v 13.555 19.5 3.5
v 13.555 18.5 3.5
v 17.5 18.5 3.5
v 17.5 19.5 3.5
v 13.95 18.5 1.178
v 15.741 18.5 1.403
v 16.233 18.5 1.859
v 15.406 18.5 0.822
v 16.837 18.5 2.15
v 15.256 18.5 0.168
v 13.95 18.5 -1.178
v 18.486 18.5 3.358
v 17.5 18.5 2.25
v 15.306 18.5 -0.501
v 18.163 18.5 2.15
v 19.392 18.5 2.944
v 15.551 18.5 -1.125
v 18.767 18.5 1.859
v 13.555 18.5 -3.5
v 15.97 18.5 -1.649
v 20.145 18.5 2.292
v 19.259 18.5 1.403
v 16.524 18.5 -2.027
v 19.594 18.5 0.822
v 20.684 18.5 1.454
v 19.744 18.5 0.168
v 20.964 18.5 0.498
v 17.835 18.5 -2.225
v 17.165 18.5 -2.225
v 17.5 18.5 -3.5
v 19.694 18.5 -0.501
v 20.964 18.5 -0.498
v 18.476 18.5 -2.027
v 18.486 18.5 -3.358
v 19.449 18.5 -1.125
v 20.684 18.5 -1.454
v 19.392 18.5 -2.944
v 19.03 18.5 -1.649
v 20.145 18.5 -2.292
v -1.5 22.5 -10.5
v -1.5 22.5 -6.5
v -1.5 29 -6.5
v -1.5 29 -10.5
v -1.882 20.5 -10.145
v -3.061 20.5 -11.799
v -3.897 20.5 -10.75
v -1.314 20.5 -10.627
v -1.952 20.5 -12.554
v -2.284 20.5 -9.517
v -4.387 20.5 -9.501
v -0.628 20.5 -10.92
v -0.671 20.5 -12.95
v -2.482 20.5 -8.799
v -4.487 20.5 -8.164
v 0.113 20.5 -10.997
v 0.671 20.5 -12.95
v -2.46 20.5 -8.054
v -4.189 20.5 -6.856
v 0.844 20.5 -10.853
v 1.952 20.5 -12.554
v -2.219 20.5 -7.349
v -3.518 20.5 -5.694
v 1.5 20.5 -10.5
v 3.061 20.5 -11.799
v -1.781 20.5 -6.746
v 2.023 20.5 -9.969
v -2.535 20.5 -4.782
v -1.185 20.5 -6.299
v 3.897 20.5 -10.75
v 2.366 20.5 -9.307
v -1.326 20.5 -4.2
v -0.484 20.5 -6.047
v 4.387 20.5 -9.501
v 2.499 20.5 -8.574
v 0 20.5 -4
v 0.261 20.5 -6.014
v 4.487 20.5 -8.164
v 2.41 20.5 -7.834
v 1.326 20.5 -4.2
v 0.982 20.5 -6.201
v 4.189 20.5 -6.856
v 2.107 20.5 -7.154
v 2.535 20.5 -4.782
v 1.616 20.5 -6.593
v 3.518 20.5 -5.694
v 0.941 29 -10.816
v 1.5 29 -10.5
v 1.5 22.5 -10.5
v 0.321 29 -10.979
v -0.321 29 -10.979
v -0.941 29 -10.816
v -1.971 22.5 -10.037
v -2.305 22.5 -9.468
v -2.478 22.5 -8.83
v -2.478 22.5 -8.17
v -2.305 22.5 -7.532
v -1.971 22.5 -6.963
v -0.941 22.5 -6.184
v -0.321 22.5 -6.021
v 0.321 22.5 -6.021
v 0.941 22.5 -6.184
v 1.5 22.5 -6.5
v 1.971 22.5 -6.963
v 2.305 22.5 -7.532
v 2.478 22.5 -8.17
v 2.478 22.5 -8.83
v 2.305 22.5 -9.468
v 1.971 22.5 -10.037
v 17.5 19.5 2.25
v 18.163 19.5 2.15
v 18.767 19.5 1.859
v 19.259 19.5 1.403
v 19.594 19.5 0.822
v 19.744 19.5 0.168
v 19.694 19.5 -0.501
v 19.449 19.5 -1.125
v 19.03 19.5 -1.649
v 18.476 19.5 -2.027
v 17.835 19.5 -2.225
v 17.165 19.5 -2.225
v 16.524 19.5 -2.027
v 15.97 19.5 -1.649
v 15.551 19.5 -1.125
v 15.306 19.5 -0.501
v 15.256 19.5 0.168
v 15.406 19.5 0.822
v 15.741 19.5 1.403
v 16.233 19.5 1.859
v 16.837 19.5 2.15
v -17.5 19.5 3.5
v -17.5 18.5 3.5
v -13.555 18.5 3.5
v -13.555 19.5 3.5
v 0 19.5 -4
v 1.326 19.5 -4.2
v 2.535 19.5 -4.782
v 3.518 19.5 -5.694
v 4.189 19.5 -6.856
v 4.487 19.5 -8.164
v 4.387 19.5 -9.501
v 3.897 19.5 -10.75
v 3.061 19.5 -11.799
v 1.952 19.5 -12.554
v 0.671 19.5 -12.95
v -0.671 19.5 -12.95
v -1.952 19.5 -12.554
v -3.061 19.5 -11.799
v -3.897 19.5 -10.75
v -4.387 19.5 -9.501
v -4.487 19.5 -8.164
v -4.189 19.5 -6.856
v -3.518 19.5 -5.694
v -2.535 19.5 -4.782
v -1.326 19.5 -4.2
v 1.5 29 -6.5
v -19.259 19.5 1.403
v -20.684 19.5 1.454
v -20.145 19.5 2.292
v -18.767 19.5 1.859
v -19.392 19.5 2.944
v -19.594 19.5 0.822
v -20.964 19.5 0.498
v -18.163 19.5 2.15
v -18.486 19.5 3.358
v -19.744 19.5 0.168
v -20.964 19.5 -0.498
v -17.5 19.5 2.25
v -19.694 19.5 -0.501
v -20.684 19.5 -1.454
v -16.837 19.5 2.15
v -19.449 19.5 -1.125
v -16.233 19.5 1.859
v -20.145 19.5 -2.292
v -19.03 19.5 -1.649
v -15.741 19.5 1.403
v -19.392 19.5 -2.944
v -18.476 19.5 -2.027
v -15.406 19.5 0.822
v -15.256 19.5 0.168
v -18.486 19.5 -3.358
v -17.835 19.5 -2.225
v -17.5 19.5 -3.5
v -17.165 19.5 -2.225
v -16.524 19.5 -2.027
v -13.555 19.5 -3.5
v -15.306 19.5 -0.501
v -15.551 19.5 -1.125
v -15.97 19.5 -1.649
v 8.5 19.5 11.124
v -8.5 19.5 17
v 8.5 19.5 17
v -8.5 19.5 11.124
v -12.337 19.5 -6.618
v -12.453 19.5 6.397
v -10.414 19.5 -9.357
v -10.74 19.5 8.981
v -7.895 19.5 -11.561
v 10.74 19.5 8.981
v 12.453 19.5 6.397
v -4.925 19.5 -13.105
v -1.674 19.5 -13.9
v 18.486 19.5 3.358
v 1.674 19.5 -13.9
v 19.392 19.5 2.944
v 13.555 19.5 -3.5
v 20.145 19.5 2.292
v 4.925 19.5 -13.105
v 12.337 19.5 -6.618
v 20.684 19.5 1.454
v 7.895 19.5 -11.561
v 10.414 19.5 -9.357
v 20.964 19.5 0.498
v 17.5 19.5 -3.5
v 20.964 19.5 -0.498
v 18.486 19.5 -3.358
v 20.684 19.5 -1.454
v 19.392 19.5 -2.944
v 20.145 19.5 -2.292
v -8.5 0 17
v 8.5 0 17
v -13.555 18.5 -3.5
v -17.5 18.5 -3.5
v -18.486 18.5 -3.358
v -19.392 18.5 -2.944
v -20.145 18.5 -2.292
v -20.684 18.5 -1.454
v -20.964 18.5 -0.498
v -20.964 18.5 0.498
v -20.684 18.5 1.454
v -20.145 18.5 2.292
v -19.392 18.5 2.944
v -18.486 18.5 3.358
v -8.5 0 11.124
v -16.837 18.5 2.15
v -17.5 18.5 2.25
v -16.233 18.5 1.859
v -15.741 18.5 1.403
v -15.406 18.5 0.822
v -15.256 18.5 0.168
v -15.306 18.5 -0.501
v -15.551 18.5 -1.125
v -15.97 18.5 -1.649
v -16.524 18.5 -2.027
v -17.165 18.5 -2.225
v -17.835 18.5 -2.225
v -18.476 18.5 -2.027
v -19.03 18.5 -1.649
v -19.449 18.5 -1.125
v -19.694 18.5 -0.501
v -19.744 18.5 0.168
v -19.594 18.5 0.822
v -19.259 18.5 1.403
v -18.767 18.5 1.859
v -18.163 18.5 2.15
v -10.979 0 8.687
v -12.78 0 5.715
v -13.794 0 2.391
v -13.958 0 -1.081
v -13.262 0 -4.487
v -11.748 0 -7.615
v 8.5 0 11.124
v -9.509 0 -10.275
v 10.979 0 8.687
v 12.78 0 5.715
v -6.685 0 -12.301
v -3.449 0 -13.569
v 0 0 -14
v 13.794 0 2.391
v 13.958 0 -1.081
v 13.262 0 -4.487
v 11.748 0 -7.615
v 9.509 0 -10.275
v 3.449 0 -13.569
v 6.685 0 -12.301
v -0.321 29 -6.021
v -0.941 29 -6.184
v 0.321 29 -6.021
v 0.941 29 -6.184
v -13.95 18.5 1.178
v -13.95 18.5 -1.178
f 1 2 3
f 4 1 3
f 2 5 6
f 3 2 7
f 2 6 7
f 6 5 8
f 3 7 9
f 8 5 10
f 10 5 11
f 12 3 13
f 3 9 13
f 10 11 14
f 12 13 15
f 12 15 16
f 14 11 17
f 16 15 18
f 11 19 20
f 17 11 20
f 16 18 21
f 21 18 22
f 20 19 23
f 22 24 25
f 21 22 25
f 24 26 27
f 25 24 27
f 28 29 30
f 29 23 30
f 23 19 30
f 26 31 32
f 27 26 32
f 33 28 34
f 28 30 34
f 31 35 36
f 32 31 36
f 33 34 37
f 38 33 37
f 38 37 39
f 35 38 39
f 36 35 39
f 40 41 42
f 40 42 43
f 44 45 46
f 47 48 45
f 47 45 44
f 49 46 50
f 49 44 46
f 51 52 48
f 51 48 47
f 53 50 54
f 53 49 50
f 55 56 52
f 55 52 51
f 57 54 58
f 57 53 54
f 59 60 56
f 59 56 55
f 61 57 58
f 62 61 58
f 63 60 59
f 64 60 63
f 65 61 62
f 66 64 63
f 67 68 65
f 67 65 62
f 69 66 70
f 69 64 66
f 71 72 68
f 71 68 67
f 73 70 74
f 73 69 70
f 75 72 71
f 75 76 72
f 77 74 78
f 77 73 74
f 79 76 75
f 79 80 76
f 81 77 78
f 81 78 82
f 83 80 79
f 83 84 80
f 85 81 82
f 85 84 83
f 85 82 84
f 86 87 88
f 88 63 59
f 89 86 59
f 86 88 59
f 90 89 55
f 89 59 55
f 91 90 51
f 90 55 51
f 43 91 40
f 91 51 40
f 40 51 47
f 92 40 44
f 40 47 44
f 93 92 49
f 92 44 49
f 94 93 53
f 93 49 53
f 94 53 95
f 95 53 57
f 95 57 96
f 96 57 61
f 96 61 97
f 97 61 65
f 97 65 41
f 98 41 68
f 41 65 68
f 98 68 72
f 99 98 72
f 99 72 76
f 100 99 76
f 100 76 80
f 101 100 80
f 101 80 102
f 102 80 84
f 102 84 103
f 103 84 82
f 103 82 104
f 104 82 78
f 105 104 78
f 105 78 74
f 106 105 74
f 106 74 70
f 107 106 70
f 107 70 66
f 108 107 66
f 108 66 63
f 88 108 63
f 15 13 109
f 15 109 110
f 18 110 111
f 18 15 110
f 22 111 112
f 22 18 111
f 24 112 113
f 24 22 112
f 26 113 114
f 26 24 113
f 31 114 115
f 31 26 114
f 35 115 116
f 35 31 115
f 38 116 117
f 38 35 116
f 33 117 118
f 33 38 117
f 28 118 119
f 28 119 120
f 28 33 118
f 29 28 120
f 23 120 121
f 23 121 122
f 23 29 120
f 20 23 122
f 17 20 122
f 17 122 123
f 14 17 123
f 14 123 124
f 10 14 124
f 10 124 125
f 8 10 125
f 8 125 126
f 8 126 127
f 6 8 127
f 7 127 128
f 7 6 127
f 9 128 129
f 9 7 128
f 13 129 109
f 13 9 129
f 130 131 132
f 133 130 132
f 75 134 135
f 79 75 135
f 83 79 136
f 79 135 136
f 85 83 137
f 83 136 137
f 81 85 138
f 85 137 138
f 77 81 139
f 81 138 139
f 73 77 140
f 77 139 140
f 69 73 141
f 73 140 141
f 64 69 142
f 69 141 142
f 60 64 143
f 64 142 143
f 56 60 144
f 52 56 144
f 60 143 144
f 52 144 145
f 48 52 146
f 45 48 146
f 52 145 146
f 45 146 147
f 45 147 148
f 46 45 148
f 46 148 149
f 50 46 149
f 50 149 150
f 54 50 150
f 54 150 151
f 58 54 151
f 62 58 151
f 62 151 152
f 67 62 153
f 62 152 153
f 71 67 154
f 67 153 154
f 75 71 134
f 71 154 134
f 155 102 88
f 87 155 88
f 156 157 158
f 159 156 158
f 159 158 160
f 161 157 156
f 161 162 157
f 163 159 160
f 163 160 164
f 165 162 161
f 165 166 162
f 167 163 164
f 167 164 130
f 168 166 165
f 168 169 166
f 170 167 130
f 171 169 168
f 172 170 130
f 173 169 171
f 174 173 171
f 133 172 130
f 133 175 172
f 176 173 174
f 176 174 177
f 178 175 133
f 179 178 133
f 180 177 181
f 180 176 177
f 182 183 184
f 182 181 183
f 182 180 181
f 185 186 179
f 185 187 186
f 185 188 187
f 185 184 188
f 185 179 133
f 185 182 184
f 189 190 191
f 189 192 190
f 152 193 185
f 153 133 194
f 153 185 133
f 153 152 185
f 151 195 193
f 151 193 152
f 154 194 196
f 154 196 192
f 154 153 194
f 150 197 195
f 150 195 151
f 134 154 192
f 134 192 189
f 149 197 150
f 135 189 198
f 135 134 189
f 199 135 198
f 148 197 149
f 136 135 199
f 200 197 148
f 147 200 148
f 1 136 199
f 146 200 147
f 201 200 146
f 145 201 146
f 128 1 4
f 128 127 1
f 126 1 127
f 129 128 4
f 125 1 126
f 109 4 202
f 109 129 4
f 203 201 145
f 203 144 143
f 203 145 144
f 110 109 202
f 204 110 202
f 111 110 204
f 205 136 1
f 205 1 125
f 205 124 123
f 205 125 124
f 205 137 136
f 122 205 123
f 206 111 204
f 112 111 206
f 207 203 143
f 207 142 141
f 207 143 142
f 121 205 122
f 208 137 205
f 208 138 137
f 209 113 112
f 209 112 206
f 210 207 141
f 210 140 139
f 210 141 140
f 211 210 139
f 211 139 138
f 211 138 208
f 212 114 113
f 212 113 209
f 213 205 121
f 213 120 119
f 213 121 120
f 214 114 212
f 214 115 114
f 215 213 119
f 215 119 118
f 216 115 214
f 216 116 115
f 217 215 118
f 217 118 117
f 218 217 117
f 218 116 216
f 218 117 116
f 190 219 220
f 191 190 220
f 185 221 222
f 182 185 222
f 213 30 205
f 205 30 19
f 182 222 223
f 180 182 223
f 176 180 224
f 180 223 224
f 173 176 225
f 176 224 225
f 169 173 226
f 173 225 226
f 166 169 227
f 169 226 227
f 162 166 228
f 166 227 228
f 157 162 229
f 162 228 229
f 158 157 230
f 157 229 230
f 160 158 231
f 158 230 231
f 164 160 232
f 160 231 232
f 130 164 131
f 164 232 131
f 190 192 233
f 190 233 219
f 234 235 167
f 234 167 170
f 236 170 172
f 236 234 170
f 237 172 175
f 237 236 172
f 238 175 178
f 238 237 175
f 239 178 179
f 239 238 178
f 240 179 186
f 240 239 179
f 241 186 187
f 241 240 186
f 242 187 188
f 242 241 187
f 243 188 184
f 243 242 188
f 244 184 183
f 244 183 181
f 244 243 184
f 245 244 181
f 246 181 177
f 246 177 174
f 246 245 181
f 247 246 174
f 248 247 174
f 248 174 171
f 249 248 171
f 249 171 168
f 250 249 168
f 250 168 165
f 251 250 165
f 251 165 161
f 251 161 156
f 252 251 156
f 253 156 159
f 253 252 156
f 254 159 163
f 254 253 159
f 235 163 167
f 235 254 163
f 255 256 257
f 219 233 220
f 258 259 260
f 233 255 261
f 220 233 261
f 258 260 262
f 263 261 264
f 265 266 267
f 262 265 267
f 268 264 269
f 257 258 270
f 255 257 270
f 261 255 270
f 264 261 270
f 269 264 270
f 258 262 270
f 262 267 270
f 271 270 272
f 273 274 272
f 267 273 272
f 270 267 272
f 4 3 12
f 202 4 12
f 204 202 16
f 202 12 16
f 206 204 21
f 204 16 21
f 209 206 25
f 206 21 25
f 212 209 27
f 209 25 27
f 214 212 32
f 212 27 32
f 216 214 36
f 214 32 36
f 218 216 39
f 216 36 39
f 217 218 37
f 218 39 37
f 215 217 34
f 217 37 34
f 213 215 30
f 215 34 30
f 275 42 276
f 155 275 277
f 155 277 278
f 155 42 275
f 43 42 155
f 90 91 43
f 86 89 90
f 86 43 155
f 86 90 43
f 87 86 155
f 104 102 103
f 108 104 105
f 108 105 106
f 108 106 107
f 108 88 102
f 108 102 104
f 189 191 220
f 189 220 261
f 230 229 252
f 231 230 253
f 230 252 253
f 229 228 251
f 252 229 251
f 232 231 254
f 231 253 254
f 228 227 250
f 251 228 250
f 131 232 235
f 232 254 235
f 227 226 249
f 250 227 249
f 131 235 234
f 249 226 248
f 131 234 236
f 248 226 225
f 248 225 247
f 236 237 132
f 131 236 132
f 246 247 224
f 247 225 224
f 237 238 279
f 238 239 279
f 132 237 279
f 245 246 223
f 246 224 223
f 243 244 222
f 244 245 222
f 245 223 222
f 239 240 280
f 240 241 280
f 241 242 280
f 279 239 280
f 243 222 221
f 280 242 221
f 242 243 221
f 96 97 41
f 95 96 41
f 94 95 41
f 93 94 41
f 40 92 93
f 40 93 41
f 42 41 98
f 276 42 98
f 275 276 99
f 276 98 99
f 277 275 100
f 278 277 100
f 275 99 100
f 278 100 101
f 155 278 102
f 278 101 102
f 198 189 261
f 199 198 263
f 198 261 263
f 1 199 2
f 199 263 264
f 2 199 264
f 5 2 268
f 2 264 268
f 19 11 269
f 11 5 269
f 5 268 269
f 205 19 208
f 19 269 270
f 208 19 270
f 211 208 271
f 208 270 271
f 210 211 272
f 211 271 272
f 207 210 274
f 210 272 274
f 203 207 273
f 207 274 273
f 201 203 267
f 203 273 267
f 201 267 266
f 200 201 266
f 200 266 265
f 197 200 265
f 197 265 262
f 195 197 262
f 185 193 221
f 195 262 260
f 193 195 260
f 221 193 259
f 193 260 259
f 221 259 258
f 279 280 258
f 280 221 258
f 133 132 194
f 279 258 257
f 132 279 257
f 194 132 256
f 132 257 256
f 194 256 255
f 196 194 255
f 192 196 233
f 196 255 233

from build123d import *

# Parameters (mm, degrees)
BOSS_EXTRUDE1_DEPTH = 19.5
BOSS_EXTRUDE2_START = 18.5
SKETCH2_3_R         = 2.250000000000002
SKETCH2_3_R_2       = 2.249999999999999
BOSS_EXTRUDE2_DEPTH = 1
BOSS_EXTRUDE3_START = 19.5
SKETCH2_4_R         = 4.5
SKETCH2_4_R_2       = 2.5000000000000004
SKETCH2_4_W         = 3
SKETCH2_4_H         = 3.9999999999999973
BOSS_EXTRUDE3_DEPTH = 1
BOSS_EXTRUDE4_START = 20.5
SKETCH2_5_W         = 3
SKETCH2_5_H         = 3.9999999999999973
BOSS_EXTRUDE4_DEPTH = 2
BOSS_EXTRUDE5_START = 22.5
SKETCH2_6_W         = 3
SKETCH2_6_H         = 3.9999999999999973
BOSS_EXTRUDE5_DEPTH = 6.5


with BuildPart() as part:
    # Sketch2 → Boss-Extrude1 (new body)
    with BuildSketch(Plane(origin=(0, 0, 0), x_dir=(1, 0, 0), z_dir=(0, 1, 0))):
        with BuildLine():
            Line((-8.500000000000002, -17), (8.499999999999998, -17))
            Line((8.499999999999998, -17), (8.499999999999998, -11.124297730643494))
            ThreePointArc((8.5, -11.124297730643494), (0, 14), (-8.5, -11.124297730643493))
            Line((-8.500000000000002, -11.124297730643494), (-8.500000000000002, -17))
        make_face()
    extrude(amount=BOSS_EXTRUDE1_DEPTH)

    # Sketch2<3> → Boss-Extrude2 (add)
    # profile 1 of 2: a face of its own
    with BuildSketch(Plane(origin=(0, 0, 0), x_dir=(1, 0, 0), z_dir=(0, 1, 0)).offset(BOSS_EXTRUDE2_START)):
        with BuildLine():
            Line((13.555441711725987, -3.4999999999999996), (17.5, -3.499999999999999))
            ThreePointArc((17.5, -3.5), (21, -2.4e-16), (17.5, 3.5))
            Line((17.5, 3.499999999999999), (13.555441711725718, 3.4999999999999987))
            ThreePointArc((13.555441711725832, 3.5000000000004934), (13.999999999999998, 2.8244e-13), (13.555441711725974, -3.4999999999999454))
        make_face()
        with Locations(Location((17.5, -3e-17, 0), (0, 0, 270))):
            Circle(SKETCH2_3_R, mode=Mode.SUBTRACT)
    # profile 2 of 2: a face of its own
    with BuildSketch(Plane(origin=(0, 0, 0), x_dir=(1, 0, 0), z_dir=(0, 1, 0)).offset(BOSS_EXTRUDE2_START)):
        with BuildLine():
            Line((-17.499999999999986, -3.5000000000000044), (-13.555441711725983, -3.500000000000004))
            ThreePointArc((-13.555441711725972, -3.4999999999999547), (-14.000000000000002, 2.7667e-13), (-13.555441711725834, 3.50000000000049))
            Line((-13.55544171172572, 3.499999999999996), (-17.499999999999986, 3.4999999999999956))
            ThreePointArc((-17.499999999999986, 3.4999999999999956), (-20.999999999999986, -3.91e-15), (-17.499999999999986, -3.5000000000000044))
        make_face()
        with Locations(Location((-17.499999999999986, -4.34e-15, 0), (0, 0, 270))):
            Circle(SKETCH2_3_R_2, mode=Mode.SUBTRACT)
    extrude(amount=BOSS_EXTRUDE2_DEPTH)

    # Sketch2<4> → Boss-Extrude3 (add)
    # profile 1 of 6: a face of its own
    with BuildSketch(Plane(origin=(0, 0, 0), x_dir=(1, 0, 0), z_dir=(0, 1, 0)).offset(BOSS_EXTRUDE3_START)):
        with Locations(Location((0, 8.5, 0), (0, 0, 270))):
            Circle(SKETCH2_4_R)
        with Locations((0, 8.5)):
            Circle(SKETCH2_4_R_2, mode=Mode.SUBTRACT)
    # profile 2 of 6: a face of its own
    with BuildSketch(Plane(origin=(0, 0, 0), x_dir=(1, 0, 0), z_dir=(0, 1, 0)).offset(BOSS_EXTRUDE3_START)):
        with Locations((0, 8.5)):
            Circle(SKETCH2_4_R_2)
    # profile 3 of 6: a face of its own
    with BuildSketch(Plane(origin=(0, 0, 0), x_dir=(1, 0, 0), z_dir=(0, 1, 0)).offset(BOSS_EXTRUDE3_START)):
        with BuildLine():
            ThreePointArc((-1.5000000000000007, 10.5), (-2.5000000000000004, 8.5), (-1.5000000000000004, 6.5))
            Line((-1.5, 6.500000000000001), (-1.5, 10.499999999999998))
        make_face()
    # profile 4 of 6: a face of its own
    with BuildSketch(Plane(origin=(0, 0, 0), x_dir=(1, 0, 0), z_dir=(0, 1, 0)).offset(BOSS_EXTRUDE3_START)):
        with BuildLine():
            Line((-1.5, 10.499999999999998), (1.5, 10.499999999999998))
            ThreePointArc((1.500000000000001, 10.5), (1.5e-16, 11), (-1.5000000000000007, 10.5))
        make_face()
    # profile 5 of 6: a face of its own
    with BuildSketch(Plane(origin=(0, 0, 0), x_dir=(1, 0, 0), z_dir=(0, 1, 0)).offset(BOSS_EXTRUDE3_START)):
        with Locations((0, 8.5)):
            Rectangle(SKETCH2_4_W, SKETCH2_4_H)
    # profile 6 of 6: a face of its own
    with BuildSketch(Plane(origin=(0, 0, 0), x_dir=(1, 0, 0), z_dir=(0, 1, 0)).offset(BOSS_EXTRUDE3_START)):
        with BuildLine():
            ThreePointArc((-1.5000000000000004, 6.5), (-4.6e-16, 6), (1.4999999999999996, 6.499999999999999))
            Line((1.5, 6.500000000000001), (-1.5, 6.500000000000001))
        make_face()
    extrude(amount=BOSS_EXTRUDE3_DEPTH)

    # Sketch2<5> → Boss-Extrude4 (add)
    with BuildSketch(Plane(origin=(0, 0, 0), x_dir=(1, 0, 0), z_dir=(0, 1, 0)).offset(BOSS_EXTRUDE4_START)):
        with BuildLine():
            ThreePointArc((-1.5000000000000004, 6.5), (-4.6e-16, 6), (1.4999999999999996, 6.499999999999999))
            Line((1.5, 6.500000000000001), (-1.5, 6.500000000000001))
        make_face()
        with Locations((0, 8.5)):
            Rectangle(SKETCH2_5_W, SKETCH2_5_H)
        with BuildLine():
            Line((1.5, 10.499999999999998), (1.5, 6.500000000000001))
            ThreePointArc((1.4999999999999996, 6.499999999999999), (2.23606797749979, 7.381966011250104), (2.5000000000000004, 8.5))
            ThreePointArc((2.5000000000000004, 8.5), (2.2360679774997902, 9.618033988749895), (1.5000000000000013, 10.5))
        make_face()
        with BuildLine():
            ThreePointArc((-1.5000000000000007, 10.5), (-2.5000000000000004, 8.5), (-1.5000000000000004, 6.5))
            Line((-1.5, 6.500000000000001), (-1.5, 10.499999999999998))
        make_face()
        with BuildLine():
            Line((-1.5, 10.499999999999998), (1.5, 10.499999999999998))
            ThreePointArc((1.500000000000001, 10.5), (1.5e-16, 11), (-1.5000000000000007, 10.5))
        make_face()
    extrude(amount=BOSS_EXTRUDE4_DEPTH)

    # Sketch2<6> → Boss-Extrude5 (add)
    with BuildSketch(Plane(origin=(0, 0, 0), x_dir=(1, 0, 0), z_dir=(0, 1, 0)).offset(BOSS_EXTRUDE5_START)):
        with BuildLine():
            ThreePointArc((-1.5000000000000004, 6.5), (-4.6e-16, 6), (1.4999999999999996, 6.499999999999999))
            Line((1.5, 6.500000000000001), (-1.5, 6.500000000000001))
        make_face()
        with Locations((0, 8.5)):
            Rectangle(SKETCH2_6_W, SKETCH2_6_H)
        with BuildLine():
            Line((-1.5, 10.499999999999998), (1.5, 10.499999999999998))
            ThreePointArc((1.500000000000001, 10.5), (1.5e-16, 11), (-1.5000000000000007, 10.5))
        make_face()
    extrude(amount=BOSS_EXTRUDE5_DEPTH)


solid = part.part
